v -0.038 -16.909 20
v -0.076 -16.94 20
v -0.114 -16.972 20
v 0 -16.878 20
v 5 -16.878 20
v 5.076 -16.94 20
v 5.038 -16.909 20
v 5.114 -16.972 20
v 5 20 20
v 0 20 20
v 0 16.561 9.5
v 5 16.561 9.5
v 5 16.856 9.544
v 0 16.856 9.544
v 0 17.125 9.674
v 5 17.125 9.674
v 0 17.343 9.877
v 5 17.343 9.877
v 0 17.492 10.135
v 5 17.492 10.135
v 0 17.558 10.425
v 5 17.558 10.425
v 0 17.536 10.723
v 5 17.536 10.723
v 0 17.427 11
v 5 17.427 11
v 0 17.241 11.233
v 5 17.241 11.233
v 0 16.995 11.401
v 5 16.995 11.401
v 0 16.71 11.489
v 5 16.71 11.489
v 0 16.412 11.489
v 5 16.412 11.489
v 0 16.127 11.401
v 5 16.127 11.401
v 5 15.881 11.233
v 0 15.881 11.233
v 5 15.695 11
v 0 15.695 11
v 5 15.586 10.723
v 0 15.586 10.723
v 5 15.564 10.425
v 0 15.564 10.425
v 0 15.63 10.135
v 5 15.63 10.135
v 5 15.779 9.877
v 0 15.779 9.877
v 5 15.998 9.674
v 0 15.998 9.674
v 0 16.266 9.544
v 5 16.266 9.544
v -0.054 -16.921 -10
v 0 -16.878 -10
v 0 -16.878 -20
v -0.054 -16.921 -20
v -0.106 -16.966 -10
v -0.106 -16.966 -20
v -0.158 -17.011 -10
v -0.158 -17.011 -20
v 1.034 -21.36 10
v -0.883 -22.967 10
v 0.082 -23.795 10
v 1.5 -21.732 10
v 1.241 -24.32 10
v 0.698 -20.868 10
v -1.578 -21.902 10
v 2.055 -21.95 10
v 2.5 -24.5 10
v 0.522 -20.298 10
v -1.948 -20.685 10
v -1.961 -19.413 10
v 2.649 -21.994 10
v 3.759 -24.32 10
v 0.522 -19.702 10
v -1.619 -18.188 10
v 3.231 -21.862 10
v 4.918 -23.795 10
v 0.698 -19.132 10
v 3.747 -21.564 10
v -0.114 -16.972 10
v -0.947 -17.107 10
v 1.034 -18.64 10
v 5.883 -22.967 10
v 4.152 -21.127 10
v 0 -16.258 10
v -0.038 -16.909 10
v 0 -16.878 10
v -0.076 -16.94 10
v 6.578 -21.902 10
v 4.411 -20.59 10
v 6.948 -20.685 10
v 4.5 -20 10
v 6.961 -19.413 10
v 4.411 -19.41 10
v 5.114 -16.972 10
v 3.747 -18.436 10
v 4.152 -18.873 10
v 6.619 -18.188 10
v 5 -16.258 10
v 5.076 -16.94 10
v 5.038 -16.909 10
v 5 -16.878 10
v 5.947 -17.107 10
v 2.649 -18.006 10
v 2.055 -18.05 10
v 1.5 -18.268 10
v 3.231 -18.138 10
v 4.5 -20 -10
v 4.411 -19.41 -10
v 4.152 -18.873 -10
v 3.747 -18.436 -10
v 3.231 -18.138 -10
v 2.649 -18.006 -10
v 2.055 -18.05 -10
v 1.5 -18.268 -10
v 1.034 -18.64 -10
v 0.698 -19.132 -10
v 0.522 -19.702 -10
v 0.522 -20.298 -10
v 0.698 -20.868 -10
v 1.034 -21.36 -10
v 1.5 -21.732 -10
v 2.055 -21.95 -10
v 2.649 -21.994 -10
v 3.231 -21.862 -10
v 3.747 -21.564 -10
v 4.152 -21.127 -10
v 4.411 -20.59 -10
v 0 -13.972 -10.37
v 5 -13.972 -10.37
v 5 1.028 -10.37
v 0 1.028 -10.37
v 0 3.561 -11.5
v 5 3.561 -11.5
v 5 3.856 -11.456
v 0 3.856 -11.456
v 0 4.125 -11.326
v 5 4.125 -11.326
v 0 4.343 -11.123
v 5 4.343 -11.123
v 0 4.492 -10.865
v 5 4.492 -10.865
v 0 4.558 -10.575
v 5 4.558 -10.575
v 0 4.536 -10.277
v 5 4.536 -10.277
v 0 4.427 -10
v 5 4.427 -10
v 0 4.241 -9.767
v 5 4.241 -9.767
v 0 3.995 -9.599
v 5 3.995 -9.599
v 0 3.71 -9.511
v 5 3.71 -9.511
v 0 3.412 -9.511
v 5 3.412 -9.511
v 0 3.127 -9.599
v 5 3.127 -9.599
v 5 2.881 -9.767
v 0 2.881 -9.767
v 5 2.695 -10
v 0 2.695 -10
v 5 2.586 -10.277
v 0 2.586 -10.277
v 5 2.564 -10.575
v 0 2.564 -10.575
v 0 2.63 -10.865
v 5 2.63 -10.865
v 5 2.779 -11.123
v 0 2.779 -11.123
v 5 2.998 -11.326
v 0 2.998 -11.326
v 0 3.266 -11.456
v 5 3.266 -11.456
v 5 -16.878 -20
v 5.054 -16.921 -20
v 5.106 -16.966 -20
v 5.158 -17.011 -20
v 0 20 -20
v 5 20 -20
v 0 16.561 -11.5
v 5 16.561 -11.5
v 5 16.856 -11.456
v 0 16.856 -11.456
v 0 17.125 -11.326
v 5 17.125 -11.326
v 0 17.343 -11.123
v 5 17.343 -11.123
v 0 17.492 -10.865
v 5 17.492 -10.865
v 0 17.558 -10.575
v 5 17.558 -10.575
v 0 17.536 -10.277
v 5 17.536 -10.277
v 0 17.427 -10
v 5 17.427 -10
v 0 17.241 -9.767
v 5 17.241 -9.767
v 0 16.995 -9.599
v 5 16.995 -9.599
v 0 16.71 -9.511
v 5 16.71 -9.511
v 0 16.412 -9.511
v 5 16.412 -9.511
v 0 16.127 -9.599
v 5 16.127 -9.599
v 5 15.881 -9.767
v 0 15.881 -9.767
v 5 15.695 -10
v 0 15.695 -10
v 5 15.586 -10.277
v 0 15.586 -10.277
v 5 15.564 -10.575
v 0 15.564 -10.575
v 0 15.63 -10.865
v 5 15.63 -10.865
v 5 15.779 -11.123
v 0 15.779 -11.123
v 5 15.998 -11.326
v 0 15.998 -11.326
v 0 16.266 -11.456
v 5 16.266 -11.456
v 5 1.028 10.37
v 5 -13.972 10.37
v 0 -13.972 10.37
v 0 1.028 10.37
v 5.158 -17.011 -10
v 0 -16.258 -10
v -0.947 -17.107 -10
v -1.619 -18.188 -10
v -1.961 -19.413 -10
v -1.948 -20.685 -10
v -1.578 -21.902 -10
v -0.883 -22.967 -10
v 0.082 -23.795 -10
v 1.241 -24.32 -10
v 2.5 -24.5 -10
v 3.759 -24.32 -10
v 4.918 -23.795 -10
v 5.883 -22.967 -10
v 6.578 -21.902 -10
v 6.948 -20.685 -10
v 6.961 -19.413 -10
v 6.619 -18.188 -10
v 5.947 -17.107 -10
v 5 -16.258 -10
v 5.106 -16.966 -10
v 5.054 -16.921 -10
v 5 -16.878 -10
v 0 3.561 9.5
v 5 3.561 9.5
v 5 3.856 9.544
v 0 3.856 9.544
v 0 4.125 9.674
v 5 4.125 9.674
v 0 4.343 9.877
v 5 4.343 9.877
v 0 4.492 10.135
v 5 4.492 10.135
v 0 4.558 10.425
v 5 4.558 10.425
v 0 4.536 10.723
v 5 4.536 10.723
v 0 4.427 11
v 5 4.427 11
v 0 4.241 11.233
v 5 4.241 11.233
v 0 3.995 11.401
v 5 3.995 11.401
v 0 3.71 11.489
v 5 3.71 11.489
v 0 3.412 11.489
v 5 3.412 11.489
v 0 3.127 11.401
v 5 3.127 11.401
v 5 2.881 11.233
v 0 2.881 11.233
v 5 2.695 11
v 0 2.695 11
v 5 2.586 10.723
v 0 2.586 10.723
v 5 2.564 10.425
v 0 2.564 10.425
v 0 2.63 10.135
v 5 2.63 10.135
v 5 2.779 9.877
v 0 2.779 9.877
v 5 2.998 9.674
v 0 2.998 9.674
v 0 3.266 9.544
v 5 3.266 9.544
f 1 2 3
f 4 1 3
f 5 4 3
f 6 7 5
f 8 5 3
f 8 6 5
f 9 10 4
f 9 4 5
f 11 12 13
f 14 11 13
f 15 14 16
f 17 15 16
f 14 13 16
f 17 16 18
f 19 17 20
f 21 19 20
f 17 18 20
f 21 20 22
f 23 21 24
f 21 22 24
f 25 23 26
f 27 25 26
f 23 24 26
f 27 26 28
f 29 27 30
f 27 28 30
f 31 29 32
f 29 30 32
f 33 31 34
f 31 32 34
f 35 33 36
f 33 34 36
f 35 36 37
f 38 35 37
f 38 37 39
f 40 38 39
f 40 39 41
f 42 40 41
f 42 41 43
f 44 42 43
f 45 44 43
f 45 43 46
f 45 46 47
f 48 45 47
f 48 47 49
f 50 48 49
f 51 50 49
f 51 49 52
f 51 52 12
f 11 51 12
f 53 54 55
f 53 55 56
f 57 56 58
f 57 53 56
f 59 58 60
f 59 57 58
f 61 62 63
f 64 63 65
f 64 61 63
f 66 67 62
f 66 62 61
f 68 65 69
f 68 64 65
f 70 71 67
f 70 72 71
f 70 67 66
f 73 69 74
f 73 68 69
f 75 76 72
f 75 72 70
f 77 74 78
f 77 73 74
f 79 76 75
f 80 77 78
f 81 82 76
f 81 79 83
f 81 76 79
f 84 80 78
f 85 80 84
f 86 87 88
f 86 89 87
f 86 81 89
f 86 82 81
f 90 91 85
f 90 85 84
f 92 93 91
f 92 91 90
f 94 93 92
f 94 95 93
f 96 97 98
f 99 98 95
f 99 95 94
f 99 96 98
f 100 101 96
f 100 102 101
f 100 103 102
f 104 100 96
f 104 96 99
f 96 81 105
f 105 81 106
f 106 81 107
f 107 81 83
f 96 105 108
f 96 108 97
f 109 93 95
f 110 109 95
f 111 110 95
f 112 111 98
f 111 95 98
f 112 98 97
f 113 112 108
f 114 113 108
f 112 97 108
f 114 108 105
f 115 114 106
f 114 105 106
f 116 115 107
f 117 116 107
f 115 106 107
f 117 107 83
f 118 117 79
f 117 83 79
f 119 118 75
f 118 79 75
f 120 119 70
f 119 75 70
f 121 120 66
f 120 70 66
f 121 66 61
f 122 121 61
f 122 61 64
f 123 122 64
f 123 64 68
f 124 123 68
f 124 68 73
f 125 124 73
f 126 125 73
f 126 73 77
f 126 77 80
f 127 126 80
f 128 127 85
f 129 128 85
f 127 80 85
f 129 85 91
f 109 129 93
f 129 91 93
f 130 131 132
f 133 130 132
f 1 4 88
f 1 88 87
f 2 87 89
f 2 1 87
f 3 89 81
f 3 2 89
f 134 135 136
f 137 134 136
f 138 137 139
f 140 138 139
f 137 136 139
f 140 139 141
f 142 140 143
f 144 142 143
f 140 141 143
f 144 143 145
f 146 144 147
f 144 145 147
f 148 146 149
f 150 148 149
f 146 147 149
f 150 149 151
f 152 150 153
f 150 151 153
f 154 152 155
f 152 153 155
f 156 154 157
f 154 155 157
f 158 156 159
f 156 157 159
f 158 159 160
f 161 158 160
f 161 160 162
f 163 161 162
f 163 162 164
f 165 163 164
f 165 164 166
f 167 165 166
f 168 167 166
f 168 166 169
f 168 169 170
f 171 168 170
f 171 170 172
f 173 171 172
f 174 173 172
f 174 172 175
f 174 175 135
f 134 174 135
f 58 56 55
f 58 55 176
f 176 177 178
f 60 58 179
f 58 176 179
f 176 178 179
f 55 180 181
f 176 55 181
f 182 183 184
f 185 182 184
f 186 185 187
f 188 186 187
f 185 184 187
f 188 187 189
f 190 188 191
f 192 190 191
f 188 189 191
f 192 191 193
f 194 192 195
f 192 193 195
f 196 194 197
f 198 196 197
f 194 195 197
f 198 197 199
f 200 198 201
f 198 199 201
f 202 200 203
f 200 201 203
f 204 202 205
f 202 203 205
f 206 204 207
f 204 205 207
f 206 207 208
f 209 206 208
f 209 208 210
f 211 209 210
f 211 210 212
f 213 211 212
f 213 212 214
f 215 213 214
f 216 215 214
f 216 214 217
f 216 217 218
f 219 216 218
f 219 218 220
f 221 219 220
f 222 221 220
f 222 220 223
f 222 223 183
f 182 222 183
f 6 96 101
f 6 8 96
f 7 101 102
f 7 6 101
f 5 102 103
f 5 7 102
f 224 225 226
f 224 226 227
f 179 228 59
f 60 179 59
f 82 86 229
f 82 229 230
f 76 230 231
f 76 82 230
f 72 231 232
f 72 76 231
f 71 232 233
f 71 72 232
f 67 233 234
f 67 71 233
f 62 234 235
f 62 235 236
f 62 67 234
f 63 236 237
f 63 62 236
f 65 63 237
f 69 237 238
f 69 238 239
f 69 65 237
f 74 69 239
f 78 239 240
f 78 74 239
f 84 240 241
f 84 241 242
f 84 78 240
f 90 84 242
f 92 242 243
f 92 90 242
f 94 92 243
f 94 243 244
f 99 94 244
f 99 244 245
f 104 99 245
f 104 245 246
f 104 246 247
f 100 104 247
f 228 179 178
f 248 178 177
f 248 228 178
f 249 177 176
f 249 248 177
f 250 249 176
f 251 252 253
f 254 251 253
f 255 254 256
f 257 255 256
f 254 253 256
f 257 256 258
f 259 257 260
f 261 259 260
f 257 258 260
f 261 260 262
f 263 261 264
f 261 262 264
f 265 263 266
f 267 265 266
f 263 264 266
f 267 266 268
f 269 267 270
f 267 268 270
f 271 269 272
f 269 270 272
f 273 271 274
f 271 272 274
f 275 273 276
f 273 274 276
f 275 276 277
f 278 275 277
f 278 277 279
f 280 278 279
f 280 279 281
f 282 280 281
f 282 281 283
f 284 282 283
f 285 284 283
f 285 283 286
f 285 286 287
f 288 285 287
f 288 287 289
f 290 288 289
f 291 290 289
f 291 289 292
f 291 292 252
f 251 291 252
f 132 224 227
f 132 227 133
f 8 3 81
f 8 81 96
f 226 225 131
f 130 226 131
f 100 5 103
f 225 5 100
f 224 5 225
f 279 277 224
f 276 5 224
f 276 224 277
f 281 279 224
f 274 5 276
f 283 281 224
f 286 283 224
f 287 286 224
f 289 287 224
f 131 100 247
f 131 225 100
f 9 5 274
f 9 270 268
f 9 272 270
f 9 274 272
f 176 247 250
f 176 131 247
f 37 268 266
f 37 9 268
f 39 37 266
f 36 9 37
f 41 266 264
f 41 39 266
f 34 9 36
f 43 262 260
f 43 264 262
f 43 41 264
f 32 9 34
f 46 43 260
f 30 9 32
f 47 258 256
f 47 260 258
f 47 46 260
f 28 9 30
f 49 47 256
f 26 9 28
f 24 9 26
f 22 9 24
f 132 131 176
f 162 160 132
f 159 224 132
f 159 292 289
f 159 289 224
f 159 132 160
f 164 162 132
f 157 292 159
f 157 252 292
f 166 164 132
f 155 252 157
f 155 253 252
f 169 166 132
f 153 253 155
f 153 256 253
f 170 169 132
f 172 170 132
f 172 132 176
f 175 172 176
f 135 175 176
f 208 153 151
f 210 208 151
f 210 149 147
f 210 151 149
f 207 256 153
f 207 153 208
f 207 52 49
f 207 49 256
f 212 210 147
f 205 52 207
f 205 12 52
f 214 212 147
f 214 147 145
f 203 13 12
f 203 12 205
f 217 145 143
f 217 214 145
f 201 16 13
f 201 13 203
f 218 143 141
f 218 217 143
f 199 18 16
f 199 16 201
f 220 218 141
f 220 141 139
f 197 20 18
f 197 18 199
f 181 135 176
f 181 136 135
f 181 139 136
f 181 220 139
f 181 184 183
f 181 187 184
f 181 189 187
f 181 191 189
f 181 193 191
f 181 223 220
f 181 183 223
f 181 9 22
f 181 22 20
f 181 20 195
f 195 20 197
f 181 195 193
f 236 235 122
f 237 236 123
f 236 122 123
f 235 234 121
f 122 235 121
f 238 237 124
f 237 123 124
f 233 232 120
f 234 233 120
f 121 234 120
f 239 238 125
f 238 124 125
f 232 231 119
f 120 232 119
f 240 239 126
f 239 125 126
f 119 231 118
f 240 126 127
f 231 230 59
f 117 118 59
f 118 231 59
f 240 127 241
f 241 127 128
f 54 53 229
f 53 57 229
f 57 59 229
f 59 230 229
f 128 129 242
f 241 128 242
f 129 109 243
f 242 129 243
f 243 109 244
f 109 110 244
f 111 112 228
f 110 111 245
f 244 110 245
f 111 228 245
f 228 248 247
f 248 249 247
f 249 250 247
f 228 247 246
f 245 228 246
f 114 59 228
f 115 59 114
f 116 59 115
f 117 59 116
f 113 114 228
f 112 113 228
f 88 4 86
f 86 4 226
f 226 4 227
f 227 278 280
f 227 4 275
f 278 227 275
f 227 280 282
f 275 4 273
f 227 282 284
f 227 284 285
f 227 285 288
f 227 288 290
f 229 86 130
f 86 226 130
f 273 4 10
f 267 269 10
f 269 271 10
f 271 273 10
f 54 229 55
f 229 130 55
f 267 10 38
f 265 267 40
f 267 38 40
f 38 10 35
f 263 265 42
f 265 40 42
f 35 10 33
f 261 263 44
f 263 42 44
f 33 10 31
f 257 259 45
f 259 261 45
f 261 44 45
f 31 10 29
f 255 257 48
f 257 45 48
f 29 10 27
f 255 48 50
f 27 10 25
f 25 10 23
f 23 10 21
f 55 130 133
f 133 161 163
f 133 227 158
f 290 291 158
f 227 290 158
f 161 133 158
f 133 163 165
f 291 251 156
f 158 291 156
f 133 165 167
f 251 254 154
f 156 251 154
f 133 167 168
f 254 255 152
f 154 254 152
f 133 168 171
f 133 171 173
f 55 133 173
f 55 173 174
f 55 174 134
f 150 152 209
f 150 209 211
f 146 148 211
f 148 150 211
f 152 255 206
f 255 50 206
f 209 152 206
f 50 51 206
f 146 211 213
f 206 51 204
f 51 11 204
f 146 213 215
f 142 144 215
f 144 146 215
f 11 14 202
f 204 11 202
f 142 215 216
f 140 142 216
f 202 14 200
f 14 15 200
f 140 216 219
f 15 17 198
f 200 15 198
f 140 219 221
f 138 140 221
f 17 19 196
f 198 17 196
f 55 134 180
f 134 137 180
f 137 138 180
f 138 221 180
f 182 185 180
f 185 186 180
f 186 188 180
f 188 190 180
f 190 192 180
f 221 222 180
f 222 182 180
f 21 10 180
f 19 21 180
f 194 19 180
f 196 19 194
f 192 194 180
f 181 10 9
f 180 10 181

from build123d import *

# Parameters (mm, degrees)
SKETCH1_W           = 40
SKETCH1_H           = 40
BOSS_EXTRUDE1_DEPTH = 5
SKETCH2_R           = 4
SKETCH2_R_2         = 1.5
BOSS_EXTRUDE2_DEPTH = 40
SKETCH4_R           = 1.5
CUT_EXTRUDE1_DEPTH  = 40
SKETCH5_W           = 9.64553252
SKETCH5_H           = 8.977750056
CUT_EXTRUDE3_DEPTH  = 10
SKETCH6_W           = 13.188128002
SKETCH6_H           = 14.056051126
CUT_EXTRUDE4_DEPTH  = 10
SKETCH8_R           = 1
CUT_EXTRUDE5_DEPTH  = 7.5
SKETCH9_W           = 20.740982478
SKETCH9_H           = 15
CUT_EXTRUDE6_DEPTH  = 7.5
SKETCH16_R          = 4.5
BOSS_EXTRUDE3_DEPTH = 20
SKETCH17_R          = 2
CUT_EXTRUDE7_DEPTH  = 20


with BuildPart() as part:
    # Sketch1 → Boss-Extrude1 (new body)
    with BuildSketch(Plane(origin=(0, 0, 0), x_dir=(0, 0, -1), z_dir=(1, 0, 0))):
        Rectangle(SKETCH1_W, SKETCH1_H)
    extrude(amount=BOSS_EXTRUDE1_DEPTH)

    # Sketch2 → Boss-Extrude2 (add)
    with BuildSketch(Plane.XY.offset(20)):
        with Locations((2.5, -20)):
            Circle(SKETCH2_R)
        with Locations((2.5, -20)):
            Circle(SKETCH2_R_2, mode=Mode.SUBTRACT)
    extrude(amount=-BOSS_EXTRUDE2_DEPTH)

    # Sketch4 → Cut-Extrude1 (cut)
    with BuildSketch(Plane.XY.offset(20)):
        with Locations((2.5, -20)):
            Circle(SKETCH4_R)
    extrude(amount=-CUT_EXTRUDE1_DEPTH, mode=Mode.SUBTRACT)

    # Sketch5 → Cut-Extrude3 (cut)
    with BuildSketch(Plane(origin=(0, 0, -20), x_dir=(-1, 0, 0), z_dir=(0, 0, -1))):
        with Locations((-2.5, -21.5)):
            Rectangle(SKETCH5_W, SKETCH5_H)
    extrude(amount=-CUT_EXTRUDE3_DEPTH, mode=Mode.SUBTRACT)

    # Sketch6 → Cut-Extrude4 (cut)
    with BuildSketch(Plane.XY.offset(20)):
        with Locations((2.5, -24)):
            Rectangle(SKETCH6_W, SKETCH6_H)
    extrude(amount=-CUT_EXTRUDE4_DEPTH, mode=Mode.SUBTRACT)

    # Sketch8 → Cut-Extrude5 (cut, through all)
    with BuildSketch(Plane(origin=(5, 0, 0), x_dir=(0, 0, -1), z_dir=(1, 0, 0))):
        with Locations((-10.5, 16.5612495)):
            Circle(SKETCH8_R)
        with Locations((10.5, 16.5612495)):
            Circle(SKETCH8_R)
        with Locations((10.5, 3.5612495)):
            Circle(SKETCH8_R)
        with Locations((-10.5, 3.5612495)):
            Circle(SKETCH8_R)
    extrude(amount=-CUT_EXTRUDE5_DEPTH, mode=Mode.SUBTRACT)

    # Sketch9 → Cut-Extrude6 (cut, through all)
    with BuildSketch(Plane(origin=(5, 0, 0), x_dir=(0, 0, -1), z_dir=(1, 0, 0))):
        with Locations((0, -6.471626191)):
            Rectangle(SKETCH9_W, SKETCH9_H)
    extrude(amount=-CUT_EXTRUDE6_DEPTH, mode=Mode.SUBTRACT)

    # Sketch16 → Boss-Extrude3 (add)
    with BuildSketch(Plane.XY.offset(10)):
        with Locations((2.5, -20)):
            Circle(SKETCH16_R)
    extrude(amount=-BOSS_EXTRUDE3_DEPTH)

    # Sketch17 → Cut-Extrude7 (cut)
    with BuildSketch(Plane.XY.offset(10)):
        with Locations((2.5, -20)):
            Circle(SKETCH17_R)
    extrude(amount=-CUT_EXTRUDE7_DEPTH, mode=Mode.SUBTRACT)


solid = part.part
